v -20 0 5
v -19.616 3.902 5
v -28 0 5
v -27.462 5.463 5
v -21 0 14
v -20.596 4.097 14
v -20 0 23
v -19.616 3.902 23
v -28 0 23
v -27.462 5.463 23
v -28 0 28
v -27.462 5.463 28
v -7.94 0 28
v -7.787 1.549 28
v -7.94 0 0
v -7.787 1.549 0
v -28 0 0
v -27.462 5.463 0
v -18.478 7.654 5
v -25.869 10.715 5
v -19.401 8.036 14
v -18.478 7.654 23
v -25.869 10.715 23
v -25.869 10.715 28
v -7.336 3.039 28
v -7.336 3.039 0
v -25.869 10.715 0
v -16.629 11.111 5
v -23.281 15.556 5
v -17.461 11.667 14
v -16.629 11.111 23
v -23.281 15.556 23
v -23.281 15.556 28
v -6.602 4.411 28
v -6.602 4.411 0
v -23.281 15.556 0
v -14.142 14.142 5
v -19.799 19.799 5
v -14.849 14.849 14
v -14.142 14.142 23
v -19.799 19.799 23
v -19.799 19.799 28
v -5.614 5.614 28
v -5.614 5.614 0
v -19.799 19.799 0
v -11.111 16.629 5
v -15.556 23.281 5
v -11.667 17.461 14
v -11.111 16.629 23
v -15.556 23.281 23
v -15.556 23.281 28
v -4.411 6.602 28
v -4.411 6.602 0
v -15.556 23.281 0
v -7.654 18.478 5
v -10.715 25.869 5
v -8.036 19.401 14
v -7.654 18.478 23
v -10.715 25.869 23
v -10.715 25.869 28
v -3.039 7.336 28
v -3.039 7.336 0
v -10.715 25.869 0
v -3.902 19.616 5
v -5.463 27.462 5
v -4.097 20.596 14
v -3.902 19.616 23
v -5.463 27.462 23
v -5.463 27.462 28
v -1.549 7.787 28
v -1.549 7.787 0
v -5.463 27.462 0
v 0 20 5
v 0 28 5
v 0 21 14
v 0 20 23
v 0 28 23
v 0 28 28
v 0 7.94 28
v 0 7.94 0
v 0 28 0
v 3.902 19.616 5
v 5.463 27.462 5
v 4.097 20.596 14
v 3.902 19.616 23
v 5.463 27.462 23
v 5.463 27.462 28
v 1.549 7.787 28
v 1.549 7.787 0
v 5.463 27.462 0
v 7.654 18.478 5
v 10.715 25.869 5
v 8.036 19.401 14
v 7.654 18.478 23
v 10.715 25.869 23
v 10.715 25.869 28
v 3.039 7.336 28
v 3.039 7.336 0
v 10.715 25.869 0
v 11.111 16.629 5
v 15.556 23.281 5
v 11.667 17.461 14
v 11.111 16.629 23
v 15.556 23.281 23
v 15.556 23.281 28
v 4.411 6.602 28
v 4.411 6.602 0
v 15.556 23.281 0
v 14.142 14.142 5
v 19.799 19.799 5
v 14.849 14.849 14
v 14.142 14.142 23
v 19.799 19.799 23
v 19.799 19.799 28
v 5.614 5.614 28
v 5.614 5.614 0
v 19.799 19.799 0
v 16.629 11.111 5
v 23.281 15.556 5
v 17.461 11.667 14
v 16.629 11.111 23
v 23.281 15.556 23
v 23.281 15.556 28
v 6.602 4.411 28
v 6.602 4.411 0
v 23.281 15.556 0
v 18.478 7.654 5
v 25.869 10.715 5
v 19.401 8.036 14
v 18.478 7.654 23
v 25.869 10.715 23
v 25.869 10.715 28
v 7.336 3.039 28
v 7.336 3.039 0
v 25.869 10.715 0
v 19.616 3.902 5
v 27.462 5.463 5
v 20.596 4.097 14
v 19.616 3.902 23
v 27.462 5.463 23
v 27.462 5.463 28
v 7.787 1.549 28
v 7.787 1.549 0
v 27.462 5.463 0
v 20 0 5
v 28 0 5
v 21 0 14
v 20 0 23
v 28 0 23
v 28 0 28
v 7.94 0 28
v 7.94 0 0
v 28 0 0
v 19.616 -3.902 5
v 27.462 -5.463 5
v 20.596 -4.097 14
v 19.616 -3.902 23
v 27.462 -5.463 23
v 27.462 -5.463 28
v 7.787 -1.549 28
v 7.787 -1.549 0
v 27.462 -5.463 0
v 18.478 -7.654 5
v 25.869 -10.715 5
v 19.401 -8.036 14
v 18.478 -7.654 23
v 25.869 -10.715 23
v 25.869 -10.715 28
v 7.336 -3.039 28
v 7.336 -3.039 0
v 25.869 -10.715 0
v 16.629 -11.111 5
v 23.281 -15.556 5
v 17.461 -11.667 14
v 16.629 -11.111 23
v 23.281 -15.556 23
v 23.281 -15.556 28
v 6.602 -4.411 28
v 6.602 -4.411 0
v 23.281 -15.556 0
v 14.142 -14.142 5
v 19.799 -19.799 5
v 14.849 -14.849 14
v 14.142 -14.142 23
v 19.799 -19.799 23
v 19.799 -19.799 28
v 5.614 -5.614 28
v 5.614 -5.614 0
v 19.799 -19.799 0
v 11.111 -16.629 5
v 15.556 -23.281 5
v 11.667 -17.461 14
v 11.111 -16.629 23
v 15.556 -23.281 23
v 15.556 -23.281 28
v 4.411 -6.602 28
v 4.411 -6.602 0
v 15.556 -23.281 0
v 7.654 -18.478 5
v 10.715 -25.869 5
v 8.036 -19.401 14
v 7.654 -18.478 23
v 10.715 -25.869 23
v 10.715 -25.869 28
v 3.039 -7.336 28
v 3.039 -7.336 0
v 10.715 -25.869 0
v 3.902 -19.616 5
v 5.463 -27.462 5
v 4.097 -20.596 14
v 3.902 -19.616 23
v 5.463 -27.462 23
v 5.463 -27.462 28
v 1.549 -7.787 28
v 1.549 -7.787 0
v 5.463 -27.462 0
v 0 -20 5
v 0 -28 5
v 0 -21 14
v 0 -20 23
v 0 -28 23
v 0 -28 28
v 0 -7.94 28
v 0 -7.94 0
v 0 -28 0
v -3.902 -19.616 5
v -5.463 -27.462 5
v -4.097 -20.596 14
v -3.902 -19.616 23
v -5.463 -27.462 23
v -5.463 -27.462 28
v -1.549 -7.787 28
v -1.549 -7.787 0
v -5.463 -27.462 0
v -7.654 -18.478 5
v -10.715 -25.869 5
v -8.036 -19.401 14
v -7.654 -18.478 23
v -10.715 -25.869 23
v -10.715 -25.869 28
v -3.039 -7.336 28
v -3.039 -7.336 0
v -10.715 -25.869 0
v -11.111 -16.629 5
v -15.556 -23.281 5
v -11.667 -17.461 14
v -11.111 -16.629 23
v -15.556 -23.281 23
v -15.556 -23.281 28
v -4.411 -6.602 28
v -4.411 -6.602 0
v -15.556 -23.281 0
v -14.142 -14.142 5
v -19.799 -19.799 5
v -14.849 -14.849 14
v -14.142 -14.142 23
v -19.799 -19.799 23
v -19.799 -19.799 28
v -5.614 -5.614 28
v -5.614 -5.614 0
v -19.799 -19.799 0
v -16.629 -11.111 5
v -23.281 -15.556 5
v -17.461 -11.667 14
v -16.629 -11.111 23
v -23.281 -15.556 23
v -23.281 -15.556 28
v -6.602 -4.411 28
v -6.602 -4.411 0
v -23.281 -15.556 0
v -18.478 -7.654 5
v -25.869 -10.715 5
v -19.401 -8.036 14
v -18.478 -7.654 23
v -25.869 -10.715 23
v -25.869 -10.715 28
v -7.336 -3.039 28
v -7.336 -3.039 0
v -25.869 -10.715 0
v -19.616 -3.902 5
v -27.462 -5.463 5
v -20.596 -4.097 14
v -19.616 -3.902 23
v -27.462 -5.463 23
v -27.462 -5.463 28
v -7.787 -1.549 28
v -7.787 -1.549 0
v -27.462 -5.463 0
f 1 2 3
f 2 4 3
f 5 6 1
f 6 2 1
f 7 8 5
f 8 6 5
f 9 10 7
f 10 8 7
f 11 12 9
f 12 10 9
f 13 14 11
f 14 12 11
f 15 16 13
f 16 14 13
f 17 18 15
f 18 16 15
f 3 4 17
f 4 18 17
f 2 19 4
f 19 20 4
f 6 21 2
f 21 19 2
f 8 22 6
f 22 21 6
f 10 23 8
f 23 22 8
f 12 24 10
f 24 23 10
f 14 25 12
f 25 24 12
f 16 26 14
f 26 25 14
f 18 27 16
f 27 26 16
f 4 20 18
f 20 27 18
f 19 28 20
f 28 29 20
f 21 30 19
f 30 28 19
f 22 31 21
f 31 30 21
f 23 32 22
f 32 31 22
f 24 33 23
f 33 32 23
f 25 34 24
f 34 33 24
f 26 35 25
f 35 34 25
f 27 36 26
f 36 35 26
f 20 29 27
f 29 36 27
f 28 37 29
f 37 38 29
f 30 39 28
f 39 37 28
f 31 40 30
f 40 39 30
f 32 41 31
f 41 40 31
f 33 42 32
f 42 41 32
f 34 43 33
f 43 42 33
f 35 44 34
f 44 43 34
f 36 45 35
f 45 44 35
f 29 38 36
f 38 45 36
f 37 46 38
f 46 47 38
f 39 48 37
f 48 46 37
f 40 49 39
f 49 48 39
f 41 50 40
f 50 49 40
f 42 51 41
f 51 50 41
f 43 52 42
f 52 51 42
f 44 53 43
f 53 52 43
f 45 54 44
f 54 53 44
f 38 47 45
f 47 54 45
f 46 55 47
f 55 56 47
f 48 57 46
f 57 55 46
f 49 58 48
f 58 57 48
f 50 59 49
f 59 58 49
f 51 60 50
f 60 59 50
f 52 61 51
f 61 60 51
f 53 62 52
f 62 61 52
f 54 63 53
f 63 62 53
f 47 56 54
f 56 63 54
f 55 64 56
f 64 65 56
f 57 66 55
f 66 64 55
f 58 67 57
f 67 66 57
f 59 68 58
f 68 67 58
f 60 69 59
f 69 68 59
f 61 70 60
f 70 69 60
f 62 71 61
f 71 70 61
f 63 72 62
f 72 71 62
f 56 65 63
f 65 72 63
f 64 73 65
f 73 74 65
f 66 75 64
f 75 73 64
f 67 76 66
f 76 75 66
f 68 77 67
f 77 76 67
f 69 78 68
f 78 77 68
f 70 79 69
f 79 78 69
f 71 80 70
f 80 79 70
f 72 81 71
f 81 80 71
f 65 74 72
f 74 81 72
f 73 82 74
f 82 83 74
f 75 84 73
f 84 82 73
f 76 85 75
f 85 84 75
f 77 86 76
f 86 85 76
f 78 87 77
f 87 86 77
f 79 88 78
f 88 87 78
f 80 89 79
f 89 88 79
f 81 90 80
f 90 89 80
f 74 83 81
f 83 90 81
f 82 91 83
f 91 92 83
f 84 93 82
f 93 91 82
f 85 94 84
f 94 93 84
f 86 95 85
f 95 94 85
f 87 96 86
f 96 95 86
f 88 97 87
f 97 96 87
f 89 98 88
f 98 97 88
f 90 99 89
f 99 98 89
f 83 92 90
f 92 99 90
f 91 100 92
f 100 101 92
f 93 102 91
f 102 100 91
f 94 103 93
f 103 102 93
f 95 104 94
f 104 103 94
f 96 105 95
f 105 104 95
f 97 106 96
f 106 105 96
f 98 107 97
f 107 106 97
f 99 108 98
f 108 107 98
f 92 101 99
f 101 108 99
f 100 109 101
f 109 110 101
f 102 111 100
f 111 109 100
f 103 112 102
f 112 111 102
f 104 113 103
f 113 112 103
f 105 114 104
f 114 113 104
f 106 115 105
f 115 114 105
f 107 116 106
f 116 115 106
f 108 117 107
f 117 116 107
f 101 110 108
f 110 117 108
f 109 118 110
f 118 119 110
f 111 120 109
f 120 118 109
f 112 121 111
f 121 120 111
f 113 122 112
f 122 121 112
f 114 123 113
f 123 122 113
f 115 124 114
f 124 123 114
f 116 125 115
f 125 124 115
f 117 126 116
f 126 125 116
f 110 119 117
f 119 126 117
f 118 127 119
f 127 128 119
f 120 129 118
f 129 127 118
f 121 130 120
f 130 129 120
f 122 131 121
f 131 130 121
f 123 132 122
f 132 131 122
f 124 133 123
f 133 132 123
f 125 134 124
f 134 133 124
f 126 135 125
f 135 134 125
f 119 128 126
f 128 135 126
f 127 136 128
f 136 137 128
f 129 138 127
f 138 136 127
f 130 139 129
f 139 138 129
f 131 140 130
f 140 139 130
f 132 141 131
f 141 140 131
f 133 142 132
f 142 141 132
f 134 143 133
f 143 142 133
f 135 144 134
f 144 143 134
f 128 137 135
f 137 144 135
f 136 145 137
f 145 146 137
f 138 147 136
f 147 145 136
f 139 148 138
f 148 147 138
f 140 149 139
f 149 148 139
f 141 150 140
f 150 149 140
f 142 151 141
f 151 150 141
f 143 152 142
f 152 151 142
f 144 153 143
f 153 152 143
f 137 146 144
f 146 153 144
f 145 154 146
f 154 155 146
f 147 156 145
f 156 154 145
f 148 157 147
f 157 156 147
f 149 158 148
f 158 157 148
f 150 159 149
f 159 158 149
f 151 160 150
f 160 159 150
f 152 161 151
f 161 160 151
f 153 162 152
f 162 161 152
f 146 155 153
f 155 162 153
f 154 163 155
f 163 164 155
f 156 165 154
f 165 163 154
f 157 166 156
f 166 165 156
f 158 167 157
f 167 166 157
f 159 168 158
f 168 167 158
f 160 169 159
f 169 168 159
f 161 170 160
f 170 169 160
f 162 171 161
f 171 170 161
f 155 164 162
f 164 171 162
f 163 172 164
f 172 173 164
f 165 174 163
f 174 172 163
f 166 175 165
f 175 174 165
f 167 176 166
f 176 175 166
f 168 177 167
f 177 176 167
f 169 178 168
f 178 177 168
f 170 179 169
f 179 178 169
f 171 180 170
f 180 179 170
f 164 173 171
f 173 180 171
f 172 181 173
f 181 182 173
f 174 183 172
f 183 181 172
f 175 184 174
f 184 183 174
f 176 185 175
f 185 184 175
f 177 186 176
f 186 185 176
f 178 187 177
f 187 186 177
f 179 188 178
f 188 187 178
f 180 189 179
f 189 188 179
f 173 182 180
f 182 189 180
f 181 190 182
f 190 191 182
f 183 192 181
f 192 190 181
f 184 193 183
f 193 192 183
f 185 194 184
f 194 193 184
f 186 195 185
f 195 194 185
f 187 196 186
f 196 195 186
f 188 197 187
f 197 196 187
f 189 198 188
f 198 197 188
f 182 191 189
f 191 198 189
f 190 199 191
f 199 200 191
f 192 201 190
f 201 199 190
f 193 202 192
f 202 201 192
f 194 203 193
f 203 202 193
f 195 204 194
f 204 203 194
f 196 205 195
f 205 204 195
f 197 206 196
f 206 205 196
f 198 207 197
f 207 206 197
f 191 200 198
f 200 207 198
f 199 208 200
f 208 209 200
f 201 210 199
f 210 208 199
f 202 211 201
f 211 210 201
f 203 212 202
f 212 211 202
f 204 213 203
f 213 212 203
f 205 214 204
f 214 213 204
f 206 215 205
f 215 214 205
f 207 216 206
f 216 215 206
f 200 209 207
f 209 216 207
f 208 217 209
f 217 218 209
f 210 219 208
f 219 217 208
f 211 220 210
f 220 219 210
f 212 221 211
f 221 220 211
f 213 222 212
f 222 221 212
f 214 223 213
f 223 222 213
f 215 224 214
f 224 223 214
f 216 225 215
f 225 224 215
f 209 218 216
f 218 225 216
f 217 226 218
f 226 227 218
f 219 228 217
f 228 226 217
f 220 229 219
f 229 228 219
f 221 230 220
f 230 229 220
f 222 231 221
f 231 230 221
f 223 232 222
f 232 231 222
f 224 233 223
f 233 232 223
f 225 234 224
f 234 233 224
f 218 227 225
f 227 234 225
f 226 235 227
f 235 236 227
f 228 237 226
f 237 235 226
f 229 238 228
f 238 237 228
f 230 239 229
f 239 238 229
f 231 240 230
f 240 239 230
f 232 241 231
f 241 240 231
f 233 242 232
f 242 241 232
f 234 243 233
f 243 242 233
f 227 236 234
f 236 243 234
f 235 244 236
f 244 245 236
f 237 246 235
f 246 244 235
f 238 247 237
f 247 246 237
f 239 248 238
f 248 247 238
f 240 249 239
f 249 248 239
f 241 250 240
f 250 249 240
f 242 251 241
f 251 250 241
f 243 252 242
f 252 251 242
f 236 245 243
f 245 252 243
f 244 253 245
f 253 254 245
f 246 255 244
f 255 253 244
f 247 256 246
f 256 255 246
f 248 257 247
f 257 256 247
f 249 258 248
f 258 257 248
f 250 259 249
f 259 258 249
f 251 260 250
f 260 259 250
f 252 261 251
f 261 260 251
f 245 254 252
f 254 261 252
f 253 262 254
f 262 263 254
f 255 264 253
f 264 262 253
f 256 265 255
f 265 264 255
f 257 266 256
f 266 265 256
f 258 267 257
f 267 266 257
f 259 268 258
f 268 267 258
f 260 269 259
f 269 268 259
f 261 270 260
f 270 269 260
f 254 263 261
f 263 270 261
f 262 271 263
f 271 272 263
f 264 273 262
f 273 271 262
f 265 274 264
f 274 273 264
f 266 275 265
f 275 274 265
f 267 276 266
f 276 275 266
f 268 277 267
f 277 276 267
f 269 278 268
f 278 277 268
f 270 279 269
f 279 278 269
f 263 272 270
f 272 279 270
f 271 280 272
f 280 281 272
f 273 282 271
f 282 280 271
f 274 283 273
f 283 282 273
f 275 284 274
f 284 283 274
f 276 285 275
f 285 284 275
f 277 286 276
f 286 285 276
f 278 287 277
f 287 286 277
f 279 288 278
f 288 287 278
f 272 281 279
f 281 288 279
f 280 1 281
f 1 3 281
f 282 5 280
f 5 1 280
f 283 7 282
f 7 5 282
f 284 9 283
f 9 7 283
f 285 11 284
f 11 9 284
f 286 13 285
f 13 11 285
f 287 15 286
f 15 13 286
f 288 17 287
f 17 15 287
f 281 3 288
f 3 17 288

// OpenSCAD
$fn = 32;

// ----------------------------------------------------------------------
// Belt roller: 40 mm barrel, 28 mm wide, bore 15.88 mm
// ----------------------------------------------------------------------

// --- parameters (mm) ---
bore_d = 15.88;           // bore
barrel_d = 40;            // barrel diameter
roller_w = 28;            // roller width
flange_d = 56;            // flange diameter
flange_t = 5;             // flange thickness
hub_d = 31.88;            // hub diameter

roller_profile = [[7.94, 0], [28, 0], [28, 5], [20, 5], [21, 14], [20, 23], [28, 23], [28, 28], [7.94, 28]];

/* the profile stays clear of the axis, so the bore comes out of the revolve */
rotate_extrude() polygon(roller_profile);
